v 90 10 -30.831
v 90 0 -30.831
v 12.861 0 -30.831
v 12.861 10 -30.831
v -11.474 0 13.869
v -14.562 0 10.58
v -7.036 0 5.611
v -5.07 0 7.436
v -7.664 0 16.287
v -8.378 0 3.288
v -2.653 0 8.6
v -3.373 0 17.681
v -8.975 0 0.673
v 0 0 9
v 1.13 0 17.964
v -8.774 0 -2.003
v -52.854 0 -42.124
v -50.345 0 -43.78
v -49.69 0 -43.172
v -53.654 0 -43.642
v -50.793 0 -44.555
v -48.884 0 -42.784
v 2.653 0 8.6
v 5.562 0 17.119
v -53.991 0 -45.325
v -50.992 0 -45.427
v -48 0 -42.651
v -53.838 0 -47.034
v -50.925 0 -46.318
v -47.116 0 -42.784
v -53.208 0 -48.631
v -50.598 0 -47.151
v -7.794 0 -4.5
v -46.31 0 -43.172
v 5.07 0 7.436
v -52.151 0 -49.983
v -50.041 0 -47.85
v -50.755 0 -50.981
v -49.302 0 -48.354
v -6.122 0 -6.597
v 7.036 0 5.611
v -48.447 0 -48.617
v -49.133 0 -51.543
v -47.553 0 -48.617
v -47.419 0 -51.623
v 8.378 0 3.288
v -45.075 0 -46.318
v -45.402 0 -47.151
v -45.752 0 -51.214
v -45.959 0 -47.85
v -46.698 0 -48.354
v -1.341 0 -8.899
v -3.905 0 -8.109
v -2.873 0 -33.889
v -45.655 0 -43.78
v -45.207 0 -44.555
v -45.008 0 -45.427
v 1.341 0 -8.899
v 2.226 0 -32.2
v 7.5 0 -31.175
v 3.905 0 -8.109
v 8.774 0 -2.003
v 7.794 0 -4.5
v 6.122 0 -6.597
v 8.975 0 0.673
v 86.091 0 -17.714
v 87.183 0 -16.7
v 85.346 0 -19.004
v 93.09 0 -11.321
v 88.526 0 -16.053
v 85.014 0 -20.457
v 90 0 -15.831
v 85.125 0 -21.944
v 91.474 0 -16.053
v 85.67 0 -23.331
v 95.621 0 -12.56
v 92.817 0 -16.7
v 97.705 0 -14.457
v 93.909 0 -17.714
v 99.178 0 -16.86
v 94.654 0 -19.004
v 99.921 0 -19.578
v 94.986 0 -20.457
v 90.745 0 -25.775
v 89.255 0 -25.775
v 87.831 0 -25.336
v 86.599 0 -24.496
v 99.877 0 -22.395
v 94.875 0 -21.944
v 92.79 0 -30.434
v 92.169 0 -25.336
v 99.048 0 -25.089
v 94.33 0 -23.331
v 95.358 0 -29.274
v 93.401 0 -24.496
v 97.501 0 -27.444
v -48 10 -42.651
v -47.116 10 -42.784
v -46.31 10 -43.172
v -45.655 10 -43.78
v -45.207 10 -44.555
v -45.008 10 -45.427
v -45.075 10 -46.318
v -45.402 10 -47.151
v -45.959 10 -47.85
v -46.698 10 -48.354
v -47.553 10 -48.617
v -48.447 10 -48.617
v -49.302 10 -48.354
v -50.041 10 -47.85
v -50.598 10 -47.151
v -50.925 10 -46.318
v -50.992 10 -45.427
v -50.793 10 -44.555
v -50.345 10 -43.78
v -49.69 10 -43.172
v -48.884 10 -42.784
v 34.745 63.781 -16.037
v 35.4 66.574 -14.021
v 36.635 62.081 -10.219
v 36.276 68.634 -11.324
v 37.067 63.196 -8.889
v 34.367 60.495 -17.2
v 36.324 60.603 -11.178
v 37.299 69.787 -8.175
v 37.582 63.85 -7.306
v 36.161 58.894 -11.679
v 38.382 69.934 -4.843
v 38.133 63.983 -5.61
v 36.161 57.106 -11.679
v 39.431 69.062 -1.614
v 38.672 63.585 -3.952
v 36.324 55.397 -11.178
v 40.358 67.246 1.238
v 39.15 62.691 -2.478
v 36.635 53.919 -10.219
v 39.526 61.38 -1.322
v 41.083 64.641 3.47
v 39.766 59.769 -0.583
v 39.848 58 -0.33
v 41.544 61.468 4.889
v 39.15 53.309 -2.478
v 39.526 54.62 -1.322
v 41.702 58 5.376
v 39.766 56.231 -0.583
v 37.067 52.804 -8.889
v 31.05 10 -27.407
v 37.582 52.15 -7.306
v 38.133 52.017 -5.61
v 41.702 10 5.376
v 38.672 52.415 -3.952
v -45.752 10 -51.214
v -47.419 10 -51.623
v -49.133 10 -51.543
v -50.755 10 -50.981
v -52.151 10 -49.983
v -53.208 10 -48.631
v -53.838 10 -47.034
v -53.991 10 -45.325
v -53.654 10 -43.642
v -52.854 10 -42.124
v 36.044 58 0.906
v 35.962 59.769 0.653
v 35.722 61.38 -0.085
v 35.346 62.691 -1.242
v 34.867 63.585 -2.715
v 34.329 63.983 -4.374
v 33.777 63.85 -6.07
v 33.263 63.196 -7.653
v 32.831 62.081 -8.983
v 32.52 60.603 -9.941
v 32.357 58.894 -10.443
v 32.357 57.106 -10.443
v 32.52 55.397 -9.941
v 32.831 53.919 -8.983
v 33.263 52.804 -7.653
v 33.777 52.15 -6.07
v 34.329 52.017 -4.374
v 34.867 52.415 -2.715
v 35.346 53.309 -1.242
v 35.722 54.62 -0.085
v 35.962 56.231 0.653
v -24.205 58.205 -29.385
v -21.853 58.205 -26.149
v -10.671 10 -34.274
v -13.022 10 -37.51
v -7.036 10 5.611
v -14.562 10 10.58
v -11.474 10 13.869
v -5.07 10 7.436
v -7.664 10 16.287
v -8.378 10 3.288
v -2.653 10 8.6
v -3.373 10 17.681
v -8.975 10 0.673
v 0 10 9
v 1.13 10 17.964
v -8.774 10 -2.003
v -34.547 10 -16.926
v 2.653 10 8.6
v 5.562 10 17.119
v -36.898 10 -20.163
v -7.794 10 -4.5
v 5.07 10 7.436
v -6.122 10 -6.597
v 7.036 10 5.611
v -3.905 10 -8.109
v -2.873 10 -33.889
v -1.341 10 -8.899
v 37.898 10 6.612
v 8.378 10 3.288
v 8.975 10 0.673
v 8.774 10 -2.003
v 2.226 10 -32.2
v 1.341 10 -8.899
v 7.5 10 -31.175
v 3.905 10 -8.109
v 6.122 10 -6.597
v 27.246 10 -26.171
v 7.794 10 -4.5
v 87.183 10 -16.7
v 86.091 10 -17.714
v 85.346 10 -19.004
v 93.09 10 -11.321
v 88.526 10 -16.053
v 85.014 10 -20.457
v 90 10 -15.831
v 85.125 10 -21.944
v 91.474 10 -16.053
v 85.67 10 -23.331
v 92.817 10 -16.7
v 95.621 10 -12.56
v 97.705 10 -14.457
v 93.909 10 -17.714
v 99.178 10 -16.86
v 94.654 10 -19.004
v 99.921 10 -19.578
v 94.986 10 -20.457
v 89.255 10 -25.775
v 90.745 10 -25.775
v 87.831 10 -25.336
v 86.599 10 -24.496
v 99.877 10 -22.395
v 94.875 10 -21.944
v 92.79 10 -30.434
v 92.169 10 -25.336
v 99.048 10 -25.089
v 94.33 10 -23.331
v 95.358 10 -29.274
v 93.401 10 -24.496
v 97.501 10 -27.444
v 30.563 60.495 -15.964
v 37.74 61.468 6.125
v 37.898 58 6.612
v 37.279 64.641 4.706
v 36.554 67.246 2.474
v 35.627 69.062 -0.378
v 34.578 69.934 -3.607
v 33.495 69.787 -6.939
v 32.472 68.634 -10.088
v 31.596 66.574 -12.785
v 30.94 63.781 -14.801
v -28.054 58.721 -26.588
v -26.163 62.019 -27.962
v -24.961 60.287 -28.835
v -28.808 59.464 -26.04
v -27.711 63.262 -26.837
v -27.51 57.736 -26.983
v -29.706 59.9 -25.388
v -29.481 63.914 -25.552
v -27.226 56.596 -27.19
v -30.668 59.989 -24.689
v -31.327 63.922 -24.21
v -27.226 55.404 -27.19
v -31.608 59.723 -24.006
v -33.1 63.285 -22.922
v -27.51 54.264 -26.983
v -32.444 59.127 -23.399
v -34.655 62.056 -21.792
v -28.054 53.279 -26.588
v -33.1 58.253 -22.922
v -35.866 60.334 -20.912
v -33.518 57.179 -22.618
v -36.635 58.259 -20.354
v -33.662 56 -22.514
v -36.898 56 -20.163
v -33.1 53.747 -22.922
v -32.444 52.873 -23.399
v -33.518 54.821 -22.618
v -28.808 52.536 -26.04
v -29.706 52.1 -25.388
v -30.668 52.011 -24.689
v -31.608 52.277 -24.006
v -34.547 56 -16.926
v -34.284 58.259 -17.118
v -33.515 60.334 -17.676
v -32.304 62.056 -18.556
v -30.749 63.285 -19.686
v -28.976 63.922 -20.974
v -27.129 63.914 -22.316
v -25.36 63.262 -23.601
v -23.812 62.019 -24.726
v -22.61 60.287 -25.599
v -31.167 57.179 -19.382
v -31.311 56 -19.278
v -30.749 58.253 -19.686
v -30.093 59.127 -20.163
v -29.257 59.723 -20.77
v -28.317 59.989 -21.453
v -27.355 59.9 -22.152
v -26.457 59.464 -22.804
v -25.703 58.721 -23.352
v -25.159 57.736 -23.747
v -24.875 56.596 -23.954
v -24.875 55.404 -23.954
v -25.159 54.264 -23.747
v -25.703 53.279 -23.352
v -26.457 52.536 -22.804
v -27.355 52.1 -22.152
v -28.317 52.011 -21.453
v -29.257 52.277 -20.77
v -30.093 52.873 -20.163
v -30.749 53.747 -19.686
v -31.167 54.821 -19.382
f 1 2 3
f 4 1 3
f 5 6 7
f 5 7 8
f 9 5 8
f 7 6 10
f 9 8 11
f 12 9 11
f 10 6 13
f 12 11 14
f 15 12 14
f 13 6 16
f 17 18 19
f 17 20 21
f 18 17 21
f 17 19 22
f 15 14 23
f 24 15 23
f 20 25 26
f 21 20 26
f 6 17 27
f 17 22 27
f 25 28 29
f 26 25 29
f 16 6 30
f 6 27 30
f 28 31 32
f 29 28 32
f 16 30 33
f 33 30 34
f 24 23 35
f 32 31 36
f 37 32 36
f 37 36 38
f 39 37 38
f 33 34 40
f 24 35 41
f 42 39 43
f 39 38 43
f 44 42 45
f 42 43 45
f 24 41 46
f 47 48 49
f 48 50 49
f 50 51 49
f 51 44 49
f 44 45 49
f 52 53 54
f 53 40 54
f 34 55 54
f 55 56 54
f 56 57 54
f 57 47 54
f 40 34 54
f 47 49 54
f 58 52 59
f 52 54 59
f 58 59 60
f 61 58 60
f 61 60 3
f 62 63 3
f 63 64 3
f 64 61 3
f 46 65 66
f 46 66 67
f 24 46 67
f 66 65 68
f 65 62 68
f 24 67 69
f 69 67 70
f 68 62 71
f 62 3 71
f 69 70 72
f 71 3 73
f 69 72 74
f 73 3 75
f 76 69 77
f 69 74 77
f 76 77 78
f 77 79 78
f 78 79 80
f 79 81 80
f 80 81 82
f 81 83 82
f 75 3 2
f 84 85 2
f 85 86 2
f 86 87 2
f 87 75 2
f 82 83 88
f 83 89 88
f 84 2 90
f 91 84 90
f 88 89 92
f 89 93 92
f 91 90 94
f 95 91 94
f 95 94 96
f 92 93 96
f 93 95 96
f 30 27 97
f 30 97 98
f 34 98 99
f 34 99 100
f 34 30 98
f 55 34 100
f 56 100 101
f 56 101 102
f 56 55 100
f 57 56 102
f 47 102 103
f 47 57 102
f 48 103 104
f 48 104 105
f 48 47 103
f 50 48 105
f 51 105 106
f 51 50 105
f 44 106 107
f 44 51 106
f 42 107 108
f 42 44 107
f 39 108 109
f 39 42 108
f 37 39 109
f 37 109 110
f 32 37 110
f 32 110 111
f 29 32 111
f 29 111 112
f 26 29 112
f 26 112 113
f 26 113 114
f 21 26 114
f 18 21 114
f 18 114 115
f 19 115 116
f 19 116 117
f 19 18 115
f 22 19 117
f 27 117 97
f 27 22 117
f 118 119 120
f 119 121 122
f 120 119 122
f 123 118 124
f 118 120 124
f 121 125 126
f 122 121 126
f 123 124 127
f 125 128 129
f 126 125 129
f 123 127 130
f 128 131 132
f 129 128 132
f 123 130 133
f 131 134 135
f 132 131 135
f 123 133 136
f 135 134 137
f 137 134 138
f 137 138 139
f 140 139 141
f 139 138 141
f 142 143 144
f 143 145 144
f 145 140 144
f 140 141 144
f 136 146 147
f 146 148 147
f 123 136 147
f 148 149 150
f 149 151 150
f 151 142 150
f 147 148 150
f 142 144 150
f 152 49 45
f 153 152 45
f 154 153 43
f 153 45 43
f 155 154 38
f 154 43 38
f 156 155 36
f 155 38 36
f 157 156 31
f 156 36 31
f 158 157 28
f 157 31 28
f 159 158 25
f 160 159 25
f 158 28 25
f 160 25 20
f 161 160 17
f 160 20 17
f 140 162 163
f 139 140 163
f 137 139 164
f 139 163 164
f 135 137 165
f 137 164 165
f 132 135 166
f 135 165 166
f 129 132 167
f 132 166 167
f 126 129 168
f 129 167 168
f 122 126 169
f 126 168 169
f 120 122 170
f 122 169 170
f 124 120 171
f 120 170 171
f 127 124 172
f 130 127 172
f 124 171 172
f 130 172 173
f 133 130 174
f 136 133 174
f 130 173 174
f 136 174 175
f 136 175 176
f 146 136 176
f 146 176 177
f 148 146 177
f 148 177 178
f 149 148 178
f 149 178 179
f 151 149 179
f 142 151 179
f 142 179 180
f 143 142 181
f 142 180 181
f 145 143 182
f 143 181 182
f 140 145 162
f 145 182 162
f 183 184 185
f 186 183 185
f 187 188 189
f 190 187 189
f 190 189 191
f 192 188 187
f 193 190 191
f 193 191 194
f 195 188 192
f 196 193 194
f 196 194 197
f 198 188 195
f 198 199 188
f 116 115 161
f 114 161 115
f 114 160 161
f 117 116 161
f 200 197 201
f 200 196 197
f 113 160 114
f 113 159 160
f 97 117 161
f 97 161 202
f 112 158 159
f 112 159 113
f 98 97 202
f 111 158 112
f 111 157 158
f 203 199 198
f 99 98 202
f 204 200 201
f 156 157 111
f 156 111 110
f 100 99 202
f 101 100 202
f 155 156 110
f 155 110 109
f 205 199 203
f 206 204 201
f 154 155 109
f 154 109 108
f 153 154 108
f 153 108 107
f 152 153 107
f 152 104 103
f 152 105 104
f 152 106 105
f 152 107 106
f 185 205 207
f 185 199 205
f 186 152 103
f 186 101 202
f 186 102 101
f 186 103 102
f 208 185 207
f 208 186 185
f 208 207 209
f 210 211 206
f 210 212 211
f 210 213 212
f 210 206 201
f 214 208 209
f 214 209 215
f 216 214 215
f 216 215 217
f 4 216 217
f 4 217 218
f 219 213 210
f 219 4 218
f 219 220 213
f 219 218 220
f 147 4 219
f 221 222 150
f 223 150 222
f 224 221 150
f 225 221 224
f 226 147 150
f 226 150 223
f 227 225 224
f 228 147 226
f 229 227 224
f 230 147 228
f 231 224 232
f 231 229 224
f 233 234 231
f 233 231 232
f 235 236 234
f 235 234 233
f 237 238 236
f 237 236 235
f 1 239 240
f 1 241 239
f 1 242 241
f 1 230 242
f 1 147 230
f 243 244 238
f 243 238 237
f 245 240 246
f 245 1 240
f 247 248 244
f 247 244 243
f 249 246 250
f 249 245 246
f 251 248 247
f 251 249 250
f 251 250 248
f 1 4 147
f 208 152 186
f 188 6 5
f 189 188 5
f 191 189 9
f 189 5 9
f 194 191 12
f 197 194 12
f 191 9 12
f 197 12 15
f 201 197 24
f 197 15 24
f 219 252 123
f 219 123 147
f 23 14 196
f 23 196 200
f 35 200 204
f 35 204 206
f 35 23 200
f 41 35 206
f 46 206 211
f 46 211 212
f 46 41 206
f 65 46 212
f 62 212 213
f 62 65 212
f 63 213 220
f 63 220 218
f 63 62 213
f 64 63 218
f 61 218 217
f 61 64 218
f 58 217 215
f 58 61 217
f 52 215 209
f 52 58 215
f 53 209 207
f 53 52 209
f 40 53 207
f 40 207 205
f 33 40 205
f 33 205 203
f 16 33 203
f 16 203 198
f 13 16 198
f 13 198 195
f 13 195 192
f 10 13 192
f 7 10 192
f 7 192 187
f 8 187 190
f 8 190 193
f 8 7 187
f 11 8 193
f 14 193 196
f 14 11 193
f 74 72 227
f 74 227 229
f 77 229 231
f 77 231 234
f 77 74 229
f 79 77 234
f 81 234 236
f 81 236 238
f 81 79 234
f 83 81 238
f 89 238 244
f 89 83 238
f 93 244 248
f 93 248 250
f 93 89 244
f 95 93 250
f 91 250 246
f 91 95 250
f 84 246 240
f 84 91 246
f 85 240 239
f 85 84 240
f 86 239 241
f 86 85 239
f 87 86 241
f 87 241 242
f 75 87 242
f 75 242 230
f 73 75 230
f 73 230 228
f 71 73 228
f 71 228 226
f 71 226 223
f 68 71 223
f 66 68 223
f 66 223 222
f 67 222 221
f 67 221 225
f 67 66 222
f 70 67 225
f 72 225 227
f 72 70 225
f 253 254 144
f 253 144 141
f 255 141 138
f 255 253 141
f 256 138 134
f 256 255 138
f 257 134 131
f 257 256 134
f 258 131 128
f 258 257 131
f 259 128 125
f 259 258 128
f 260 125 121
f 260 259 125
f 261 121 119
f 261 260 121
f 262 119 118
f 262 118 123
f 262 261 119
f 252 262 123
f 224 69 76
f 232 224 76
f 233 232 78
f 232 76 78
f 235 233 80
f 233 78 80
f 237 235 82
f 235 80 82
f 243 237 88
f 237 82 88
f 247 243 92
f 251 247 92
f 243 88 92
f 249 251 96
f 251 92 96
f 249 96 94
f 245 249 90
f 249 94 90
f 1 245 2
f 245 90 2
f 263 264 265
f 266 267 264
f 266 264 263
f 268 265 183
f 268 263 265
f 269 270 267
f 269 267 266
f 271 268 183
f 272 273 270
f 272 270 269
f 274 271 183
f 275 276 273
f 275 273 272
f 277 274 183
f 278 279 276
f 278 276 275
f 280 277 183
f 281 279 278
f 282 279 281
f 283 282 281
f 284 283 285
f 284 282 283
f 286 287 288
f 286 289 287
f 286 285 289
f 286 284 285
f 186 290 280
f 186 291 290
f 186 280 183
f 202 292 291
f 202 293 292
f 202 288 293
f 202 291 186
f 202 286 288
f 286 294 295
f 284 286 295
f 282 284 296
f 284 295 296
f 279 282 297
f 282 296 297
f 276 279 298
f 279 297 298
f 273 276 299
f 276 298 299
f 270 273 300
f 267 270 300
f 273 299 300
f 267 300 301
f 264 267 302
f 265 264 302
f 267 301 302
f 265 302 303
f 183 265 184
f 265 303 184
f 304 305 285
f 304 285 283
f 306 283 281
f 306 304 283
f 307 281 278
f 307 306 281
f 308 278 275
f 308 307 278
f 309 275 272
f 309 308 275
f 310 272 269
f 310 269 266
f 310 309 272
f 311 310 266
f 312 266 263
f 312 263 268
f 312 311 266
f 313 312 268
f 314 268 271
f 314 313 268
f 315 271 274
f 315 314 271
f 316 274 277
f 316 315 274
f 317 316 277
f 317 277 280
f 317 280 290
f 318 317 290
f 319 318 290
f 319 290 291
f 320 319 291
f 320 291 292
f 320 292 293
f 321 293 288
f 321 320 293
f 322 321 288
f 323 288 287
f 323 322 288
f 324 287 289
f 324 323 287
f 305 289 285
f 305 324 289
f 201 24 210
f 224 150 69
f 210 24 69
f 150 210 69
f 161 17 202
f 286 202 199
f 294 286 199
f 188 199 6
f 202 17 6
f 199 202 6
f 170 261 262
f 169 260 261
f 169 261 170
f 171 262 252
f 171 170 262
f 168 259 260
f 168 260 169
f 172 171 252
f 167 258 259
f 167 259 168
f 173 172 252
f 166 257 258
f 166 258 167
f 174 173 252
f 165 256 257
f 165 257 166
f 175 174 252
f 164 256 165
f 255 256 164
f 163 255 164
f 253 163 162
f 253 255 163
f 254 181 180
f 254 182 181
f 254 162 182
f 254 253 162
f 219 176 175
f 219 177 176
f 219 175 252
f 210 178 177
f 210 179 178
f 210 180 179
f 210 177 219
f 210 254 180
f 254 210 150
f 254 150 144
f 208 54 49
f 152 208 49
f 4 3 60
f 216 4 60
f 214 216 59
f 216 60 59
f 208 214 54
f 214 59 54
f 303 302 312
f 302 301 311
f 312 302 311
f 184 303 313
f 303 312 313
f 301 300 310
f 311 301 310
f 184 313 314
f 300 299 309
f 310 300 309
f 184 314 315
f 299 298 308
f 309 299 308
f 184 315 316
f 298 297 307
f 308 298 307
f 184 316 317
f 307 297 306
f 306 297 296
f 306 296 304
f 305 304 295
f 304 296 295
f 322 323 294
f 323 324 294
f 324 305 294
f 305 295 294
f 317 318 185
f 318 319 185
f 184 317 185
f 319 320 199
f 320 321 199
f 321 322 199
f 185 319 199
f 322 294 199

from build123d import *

# Parameters (mm, degrees)
SKETCH1_R           = 9
SKETCH1_R_2         = 3
SKETCH1_R_3         = 5
BOSS_EXTRUDE1_DEPTH = 10
SKETCH_L_R          = 6
BOSS_EXTRUDE2_DEPTH = 4
SKETCH6_R           = 4
BOSS_EXTRUDE3_DEPTH = 4


with BuildPart() as part:
    # Sketch1 → Boss-Extrude1 (new body)
    with BuildSketch(Plane(origin=(0, 0, 0), x_dir=(1, 0, 0), z_dir=(0, 1, 0))):
        with BuildLine():
            Line((5.562305899, -17.119017293), (93.090169944, 11.320509704))
            ThreePointArc((93.090169944, 11.320509704), (99.876883406, 22.395419517), (90, 30.831074867))
            Line((90, 30.831074867), (12.860666935, 30.831074867))
            ThreePointArc((12.860666935, 30.831074867), (4.846689129, 31.602733162), (-2.872809988, 33.889352975))
            Line((-2.872809988, 33.889352975), (-45.75236044, 51.21381591))
            ThreePointArc((-45.75236044, 51.21381591), (-52.728064522, 49.344681634), (-52.854101966, 42.124001268))
            Line((-52.854101966, 42.124001268), (-14.562305899, -10.580134541))
            ThreePointArc((-14.562305899, -10.580134541), (-5.562305899, -17.119017293), (5.562305899, -17.119017293))
        make_face()
        with Locations(Location((0, 0, 0), (0, 0, 270))):
            Circle(SKETCH1_R, mode=Mode.SUBTRACT)
        with Locations(Location((-48, 45.650712782, 0), (0, 0, 270))):
            Circle(SKETCH1_R_2, mode=Mode.SUBTRACT)
        with Locations(Location((90, 20.831074867, 0), (0, 0, 270))):
            Circle(SKETCH1_R_3, mode=Mode.SUBTRACT)
    extrude(amount=BOSS_EXTRUDE1_DEPTH)

    # Sketch l → Boss-Extrude2 (add)
    with BuildSketch(Plane(origin=(32.335921554, 0, -10.506577809), x_dir=(0, -1, 0), z_dir=(-0.9510565162951555, 0, 0.3090169943749418))):
        with BuildLine():
            Line((-10, 18), (-58, 18))
            ThreePointArc((-58, 18), (-69.934262744, 7.254341559), (-60.49494029, -5.737771209))
            Line((-60.49494029, -5.737771209), (-10, -16.470802099))
            Line((-10, -16.470802099), (-10, 18))
        make_face()
        with Locations(Location((-58, 6, 0), (0, 0, 90))):
            Circle(SKETCH_L_R, mode=Mode.SUBTRACT)
    extrude(amount=-BOSS_EXTRUDE2_DEPTH)

    # Sketch6 → Boss-Extrude3 (add)
    with BuildSketch(Plane(origin=(-19.984698578, 0, -27.506577809), x_dir=(0, -1, 0), z_dir=(-0.5877852522924776, 0, -0.8090169943749442))):
        with BuildLine():
            Line((-10, 18), (-56, 18))
            ThreePointArc((-56, 18), (-63.92214455, 11.113384808), (-58.205098847, 2.309906432))
            Line((-58.205098847, 2.309906432), (-10, -11.512683232))
            Line((-10, -11.512683232), (-10, 18))
        make_face()
        with Locations(Location((-56, 10, 0), (0, 0, 90))):
            Circle(SKETCH6_R, mode=Mode.SUBTRACT)
    extrude(amount=BOSS_EXTRUDE3_DEPTH)


solid = part.part
